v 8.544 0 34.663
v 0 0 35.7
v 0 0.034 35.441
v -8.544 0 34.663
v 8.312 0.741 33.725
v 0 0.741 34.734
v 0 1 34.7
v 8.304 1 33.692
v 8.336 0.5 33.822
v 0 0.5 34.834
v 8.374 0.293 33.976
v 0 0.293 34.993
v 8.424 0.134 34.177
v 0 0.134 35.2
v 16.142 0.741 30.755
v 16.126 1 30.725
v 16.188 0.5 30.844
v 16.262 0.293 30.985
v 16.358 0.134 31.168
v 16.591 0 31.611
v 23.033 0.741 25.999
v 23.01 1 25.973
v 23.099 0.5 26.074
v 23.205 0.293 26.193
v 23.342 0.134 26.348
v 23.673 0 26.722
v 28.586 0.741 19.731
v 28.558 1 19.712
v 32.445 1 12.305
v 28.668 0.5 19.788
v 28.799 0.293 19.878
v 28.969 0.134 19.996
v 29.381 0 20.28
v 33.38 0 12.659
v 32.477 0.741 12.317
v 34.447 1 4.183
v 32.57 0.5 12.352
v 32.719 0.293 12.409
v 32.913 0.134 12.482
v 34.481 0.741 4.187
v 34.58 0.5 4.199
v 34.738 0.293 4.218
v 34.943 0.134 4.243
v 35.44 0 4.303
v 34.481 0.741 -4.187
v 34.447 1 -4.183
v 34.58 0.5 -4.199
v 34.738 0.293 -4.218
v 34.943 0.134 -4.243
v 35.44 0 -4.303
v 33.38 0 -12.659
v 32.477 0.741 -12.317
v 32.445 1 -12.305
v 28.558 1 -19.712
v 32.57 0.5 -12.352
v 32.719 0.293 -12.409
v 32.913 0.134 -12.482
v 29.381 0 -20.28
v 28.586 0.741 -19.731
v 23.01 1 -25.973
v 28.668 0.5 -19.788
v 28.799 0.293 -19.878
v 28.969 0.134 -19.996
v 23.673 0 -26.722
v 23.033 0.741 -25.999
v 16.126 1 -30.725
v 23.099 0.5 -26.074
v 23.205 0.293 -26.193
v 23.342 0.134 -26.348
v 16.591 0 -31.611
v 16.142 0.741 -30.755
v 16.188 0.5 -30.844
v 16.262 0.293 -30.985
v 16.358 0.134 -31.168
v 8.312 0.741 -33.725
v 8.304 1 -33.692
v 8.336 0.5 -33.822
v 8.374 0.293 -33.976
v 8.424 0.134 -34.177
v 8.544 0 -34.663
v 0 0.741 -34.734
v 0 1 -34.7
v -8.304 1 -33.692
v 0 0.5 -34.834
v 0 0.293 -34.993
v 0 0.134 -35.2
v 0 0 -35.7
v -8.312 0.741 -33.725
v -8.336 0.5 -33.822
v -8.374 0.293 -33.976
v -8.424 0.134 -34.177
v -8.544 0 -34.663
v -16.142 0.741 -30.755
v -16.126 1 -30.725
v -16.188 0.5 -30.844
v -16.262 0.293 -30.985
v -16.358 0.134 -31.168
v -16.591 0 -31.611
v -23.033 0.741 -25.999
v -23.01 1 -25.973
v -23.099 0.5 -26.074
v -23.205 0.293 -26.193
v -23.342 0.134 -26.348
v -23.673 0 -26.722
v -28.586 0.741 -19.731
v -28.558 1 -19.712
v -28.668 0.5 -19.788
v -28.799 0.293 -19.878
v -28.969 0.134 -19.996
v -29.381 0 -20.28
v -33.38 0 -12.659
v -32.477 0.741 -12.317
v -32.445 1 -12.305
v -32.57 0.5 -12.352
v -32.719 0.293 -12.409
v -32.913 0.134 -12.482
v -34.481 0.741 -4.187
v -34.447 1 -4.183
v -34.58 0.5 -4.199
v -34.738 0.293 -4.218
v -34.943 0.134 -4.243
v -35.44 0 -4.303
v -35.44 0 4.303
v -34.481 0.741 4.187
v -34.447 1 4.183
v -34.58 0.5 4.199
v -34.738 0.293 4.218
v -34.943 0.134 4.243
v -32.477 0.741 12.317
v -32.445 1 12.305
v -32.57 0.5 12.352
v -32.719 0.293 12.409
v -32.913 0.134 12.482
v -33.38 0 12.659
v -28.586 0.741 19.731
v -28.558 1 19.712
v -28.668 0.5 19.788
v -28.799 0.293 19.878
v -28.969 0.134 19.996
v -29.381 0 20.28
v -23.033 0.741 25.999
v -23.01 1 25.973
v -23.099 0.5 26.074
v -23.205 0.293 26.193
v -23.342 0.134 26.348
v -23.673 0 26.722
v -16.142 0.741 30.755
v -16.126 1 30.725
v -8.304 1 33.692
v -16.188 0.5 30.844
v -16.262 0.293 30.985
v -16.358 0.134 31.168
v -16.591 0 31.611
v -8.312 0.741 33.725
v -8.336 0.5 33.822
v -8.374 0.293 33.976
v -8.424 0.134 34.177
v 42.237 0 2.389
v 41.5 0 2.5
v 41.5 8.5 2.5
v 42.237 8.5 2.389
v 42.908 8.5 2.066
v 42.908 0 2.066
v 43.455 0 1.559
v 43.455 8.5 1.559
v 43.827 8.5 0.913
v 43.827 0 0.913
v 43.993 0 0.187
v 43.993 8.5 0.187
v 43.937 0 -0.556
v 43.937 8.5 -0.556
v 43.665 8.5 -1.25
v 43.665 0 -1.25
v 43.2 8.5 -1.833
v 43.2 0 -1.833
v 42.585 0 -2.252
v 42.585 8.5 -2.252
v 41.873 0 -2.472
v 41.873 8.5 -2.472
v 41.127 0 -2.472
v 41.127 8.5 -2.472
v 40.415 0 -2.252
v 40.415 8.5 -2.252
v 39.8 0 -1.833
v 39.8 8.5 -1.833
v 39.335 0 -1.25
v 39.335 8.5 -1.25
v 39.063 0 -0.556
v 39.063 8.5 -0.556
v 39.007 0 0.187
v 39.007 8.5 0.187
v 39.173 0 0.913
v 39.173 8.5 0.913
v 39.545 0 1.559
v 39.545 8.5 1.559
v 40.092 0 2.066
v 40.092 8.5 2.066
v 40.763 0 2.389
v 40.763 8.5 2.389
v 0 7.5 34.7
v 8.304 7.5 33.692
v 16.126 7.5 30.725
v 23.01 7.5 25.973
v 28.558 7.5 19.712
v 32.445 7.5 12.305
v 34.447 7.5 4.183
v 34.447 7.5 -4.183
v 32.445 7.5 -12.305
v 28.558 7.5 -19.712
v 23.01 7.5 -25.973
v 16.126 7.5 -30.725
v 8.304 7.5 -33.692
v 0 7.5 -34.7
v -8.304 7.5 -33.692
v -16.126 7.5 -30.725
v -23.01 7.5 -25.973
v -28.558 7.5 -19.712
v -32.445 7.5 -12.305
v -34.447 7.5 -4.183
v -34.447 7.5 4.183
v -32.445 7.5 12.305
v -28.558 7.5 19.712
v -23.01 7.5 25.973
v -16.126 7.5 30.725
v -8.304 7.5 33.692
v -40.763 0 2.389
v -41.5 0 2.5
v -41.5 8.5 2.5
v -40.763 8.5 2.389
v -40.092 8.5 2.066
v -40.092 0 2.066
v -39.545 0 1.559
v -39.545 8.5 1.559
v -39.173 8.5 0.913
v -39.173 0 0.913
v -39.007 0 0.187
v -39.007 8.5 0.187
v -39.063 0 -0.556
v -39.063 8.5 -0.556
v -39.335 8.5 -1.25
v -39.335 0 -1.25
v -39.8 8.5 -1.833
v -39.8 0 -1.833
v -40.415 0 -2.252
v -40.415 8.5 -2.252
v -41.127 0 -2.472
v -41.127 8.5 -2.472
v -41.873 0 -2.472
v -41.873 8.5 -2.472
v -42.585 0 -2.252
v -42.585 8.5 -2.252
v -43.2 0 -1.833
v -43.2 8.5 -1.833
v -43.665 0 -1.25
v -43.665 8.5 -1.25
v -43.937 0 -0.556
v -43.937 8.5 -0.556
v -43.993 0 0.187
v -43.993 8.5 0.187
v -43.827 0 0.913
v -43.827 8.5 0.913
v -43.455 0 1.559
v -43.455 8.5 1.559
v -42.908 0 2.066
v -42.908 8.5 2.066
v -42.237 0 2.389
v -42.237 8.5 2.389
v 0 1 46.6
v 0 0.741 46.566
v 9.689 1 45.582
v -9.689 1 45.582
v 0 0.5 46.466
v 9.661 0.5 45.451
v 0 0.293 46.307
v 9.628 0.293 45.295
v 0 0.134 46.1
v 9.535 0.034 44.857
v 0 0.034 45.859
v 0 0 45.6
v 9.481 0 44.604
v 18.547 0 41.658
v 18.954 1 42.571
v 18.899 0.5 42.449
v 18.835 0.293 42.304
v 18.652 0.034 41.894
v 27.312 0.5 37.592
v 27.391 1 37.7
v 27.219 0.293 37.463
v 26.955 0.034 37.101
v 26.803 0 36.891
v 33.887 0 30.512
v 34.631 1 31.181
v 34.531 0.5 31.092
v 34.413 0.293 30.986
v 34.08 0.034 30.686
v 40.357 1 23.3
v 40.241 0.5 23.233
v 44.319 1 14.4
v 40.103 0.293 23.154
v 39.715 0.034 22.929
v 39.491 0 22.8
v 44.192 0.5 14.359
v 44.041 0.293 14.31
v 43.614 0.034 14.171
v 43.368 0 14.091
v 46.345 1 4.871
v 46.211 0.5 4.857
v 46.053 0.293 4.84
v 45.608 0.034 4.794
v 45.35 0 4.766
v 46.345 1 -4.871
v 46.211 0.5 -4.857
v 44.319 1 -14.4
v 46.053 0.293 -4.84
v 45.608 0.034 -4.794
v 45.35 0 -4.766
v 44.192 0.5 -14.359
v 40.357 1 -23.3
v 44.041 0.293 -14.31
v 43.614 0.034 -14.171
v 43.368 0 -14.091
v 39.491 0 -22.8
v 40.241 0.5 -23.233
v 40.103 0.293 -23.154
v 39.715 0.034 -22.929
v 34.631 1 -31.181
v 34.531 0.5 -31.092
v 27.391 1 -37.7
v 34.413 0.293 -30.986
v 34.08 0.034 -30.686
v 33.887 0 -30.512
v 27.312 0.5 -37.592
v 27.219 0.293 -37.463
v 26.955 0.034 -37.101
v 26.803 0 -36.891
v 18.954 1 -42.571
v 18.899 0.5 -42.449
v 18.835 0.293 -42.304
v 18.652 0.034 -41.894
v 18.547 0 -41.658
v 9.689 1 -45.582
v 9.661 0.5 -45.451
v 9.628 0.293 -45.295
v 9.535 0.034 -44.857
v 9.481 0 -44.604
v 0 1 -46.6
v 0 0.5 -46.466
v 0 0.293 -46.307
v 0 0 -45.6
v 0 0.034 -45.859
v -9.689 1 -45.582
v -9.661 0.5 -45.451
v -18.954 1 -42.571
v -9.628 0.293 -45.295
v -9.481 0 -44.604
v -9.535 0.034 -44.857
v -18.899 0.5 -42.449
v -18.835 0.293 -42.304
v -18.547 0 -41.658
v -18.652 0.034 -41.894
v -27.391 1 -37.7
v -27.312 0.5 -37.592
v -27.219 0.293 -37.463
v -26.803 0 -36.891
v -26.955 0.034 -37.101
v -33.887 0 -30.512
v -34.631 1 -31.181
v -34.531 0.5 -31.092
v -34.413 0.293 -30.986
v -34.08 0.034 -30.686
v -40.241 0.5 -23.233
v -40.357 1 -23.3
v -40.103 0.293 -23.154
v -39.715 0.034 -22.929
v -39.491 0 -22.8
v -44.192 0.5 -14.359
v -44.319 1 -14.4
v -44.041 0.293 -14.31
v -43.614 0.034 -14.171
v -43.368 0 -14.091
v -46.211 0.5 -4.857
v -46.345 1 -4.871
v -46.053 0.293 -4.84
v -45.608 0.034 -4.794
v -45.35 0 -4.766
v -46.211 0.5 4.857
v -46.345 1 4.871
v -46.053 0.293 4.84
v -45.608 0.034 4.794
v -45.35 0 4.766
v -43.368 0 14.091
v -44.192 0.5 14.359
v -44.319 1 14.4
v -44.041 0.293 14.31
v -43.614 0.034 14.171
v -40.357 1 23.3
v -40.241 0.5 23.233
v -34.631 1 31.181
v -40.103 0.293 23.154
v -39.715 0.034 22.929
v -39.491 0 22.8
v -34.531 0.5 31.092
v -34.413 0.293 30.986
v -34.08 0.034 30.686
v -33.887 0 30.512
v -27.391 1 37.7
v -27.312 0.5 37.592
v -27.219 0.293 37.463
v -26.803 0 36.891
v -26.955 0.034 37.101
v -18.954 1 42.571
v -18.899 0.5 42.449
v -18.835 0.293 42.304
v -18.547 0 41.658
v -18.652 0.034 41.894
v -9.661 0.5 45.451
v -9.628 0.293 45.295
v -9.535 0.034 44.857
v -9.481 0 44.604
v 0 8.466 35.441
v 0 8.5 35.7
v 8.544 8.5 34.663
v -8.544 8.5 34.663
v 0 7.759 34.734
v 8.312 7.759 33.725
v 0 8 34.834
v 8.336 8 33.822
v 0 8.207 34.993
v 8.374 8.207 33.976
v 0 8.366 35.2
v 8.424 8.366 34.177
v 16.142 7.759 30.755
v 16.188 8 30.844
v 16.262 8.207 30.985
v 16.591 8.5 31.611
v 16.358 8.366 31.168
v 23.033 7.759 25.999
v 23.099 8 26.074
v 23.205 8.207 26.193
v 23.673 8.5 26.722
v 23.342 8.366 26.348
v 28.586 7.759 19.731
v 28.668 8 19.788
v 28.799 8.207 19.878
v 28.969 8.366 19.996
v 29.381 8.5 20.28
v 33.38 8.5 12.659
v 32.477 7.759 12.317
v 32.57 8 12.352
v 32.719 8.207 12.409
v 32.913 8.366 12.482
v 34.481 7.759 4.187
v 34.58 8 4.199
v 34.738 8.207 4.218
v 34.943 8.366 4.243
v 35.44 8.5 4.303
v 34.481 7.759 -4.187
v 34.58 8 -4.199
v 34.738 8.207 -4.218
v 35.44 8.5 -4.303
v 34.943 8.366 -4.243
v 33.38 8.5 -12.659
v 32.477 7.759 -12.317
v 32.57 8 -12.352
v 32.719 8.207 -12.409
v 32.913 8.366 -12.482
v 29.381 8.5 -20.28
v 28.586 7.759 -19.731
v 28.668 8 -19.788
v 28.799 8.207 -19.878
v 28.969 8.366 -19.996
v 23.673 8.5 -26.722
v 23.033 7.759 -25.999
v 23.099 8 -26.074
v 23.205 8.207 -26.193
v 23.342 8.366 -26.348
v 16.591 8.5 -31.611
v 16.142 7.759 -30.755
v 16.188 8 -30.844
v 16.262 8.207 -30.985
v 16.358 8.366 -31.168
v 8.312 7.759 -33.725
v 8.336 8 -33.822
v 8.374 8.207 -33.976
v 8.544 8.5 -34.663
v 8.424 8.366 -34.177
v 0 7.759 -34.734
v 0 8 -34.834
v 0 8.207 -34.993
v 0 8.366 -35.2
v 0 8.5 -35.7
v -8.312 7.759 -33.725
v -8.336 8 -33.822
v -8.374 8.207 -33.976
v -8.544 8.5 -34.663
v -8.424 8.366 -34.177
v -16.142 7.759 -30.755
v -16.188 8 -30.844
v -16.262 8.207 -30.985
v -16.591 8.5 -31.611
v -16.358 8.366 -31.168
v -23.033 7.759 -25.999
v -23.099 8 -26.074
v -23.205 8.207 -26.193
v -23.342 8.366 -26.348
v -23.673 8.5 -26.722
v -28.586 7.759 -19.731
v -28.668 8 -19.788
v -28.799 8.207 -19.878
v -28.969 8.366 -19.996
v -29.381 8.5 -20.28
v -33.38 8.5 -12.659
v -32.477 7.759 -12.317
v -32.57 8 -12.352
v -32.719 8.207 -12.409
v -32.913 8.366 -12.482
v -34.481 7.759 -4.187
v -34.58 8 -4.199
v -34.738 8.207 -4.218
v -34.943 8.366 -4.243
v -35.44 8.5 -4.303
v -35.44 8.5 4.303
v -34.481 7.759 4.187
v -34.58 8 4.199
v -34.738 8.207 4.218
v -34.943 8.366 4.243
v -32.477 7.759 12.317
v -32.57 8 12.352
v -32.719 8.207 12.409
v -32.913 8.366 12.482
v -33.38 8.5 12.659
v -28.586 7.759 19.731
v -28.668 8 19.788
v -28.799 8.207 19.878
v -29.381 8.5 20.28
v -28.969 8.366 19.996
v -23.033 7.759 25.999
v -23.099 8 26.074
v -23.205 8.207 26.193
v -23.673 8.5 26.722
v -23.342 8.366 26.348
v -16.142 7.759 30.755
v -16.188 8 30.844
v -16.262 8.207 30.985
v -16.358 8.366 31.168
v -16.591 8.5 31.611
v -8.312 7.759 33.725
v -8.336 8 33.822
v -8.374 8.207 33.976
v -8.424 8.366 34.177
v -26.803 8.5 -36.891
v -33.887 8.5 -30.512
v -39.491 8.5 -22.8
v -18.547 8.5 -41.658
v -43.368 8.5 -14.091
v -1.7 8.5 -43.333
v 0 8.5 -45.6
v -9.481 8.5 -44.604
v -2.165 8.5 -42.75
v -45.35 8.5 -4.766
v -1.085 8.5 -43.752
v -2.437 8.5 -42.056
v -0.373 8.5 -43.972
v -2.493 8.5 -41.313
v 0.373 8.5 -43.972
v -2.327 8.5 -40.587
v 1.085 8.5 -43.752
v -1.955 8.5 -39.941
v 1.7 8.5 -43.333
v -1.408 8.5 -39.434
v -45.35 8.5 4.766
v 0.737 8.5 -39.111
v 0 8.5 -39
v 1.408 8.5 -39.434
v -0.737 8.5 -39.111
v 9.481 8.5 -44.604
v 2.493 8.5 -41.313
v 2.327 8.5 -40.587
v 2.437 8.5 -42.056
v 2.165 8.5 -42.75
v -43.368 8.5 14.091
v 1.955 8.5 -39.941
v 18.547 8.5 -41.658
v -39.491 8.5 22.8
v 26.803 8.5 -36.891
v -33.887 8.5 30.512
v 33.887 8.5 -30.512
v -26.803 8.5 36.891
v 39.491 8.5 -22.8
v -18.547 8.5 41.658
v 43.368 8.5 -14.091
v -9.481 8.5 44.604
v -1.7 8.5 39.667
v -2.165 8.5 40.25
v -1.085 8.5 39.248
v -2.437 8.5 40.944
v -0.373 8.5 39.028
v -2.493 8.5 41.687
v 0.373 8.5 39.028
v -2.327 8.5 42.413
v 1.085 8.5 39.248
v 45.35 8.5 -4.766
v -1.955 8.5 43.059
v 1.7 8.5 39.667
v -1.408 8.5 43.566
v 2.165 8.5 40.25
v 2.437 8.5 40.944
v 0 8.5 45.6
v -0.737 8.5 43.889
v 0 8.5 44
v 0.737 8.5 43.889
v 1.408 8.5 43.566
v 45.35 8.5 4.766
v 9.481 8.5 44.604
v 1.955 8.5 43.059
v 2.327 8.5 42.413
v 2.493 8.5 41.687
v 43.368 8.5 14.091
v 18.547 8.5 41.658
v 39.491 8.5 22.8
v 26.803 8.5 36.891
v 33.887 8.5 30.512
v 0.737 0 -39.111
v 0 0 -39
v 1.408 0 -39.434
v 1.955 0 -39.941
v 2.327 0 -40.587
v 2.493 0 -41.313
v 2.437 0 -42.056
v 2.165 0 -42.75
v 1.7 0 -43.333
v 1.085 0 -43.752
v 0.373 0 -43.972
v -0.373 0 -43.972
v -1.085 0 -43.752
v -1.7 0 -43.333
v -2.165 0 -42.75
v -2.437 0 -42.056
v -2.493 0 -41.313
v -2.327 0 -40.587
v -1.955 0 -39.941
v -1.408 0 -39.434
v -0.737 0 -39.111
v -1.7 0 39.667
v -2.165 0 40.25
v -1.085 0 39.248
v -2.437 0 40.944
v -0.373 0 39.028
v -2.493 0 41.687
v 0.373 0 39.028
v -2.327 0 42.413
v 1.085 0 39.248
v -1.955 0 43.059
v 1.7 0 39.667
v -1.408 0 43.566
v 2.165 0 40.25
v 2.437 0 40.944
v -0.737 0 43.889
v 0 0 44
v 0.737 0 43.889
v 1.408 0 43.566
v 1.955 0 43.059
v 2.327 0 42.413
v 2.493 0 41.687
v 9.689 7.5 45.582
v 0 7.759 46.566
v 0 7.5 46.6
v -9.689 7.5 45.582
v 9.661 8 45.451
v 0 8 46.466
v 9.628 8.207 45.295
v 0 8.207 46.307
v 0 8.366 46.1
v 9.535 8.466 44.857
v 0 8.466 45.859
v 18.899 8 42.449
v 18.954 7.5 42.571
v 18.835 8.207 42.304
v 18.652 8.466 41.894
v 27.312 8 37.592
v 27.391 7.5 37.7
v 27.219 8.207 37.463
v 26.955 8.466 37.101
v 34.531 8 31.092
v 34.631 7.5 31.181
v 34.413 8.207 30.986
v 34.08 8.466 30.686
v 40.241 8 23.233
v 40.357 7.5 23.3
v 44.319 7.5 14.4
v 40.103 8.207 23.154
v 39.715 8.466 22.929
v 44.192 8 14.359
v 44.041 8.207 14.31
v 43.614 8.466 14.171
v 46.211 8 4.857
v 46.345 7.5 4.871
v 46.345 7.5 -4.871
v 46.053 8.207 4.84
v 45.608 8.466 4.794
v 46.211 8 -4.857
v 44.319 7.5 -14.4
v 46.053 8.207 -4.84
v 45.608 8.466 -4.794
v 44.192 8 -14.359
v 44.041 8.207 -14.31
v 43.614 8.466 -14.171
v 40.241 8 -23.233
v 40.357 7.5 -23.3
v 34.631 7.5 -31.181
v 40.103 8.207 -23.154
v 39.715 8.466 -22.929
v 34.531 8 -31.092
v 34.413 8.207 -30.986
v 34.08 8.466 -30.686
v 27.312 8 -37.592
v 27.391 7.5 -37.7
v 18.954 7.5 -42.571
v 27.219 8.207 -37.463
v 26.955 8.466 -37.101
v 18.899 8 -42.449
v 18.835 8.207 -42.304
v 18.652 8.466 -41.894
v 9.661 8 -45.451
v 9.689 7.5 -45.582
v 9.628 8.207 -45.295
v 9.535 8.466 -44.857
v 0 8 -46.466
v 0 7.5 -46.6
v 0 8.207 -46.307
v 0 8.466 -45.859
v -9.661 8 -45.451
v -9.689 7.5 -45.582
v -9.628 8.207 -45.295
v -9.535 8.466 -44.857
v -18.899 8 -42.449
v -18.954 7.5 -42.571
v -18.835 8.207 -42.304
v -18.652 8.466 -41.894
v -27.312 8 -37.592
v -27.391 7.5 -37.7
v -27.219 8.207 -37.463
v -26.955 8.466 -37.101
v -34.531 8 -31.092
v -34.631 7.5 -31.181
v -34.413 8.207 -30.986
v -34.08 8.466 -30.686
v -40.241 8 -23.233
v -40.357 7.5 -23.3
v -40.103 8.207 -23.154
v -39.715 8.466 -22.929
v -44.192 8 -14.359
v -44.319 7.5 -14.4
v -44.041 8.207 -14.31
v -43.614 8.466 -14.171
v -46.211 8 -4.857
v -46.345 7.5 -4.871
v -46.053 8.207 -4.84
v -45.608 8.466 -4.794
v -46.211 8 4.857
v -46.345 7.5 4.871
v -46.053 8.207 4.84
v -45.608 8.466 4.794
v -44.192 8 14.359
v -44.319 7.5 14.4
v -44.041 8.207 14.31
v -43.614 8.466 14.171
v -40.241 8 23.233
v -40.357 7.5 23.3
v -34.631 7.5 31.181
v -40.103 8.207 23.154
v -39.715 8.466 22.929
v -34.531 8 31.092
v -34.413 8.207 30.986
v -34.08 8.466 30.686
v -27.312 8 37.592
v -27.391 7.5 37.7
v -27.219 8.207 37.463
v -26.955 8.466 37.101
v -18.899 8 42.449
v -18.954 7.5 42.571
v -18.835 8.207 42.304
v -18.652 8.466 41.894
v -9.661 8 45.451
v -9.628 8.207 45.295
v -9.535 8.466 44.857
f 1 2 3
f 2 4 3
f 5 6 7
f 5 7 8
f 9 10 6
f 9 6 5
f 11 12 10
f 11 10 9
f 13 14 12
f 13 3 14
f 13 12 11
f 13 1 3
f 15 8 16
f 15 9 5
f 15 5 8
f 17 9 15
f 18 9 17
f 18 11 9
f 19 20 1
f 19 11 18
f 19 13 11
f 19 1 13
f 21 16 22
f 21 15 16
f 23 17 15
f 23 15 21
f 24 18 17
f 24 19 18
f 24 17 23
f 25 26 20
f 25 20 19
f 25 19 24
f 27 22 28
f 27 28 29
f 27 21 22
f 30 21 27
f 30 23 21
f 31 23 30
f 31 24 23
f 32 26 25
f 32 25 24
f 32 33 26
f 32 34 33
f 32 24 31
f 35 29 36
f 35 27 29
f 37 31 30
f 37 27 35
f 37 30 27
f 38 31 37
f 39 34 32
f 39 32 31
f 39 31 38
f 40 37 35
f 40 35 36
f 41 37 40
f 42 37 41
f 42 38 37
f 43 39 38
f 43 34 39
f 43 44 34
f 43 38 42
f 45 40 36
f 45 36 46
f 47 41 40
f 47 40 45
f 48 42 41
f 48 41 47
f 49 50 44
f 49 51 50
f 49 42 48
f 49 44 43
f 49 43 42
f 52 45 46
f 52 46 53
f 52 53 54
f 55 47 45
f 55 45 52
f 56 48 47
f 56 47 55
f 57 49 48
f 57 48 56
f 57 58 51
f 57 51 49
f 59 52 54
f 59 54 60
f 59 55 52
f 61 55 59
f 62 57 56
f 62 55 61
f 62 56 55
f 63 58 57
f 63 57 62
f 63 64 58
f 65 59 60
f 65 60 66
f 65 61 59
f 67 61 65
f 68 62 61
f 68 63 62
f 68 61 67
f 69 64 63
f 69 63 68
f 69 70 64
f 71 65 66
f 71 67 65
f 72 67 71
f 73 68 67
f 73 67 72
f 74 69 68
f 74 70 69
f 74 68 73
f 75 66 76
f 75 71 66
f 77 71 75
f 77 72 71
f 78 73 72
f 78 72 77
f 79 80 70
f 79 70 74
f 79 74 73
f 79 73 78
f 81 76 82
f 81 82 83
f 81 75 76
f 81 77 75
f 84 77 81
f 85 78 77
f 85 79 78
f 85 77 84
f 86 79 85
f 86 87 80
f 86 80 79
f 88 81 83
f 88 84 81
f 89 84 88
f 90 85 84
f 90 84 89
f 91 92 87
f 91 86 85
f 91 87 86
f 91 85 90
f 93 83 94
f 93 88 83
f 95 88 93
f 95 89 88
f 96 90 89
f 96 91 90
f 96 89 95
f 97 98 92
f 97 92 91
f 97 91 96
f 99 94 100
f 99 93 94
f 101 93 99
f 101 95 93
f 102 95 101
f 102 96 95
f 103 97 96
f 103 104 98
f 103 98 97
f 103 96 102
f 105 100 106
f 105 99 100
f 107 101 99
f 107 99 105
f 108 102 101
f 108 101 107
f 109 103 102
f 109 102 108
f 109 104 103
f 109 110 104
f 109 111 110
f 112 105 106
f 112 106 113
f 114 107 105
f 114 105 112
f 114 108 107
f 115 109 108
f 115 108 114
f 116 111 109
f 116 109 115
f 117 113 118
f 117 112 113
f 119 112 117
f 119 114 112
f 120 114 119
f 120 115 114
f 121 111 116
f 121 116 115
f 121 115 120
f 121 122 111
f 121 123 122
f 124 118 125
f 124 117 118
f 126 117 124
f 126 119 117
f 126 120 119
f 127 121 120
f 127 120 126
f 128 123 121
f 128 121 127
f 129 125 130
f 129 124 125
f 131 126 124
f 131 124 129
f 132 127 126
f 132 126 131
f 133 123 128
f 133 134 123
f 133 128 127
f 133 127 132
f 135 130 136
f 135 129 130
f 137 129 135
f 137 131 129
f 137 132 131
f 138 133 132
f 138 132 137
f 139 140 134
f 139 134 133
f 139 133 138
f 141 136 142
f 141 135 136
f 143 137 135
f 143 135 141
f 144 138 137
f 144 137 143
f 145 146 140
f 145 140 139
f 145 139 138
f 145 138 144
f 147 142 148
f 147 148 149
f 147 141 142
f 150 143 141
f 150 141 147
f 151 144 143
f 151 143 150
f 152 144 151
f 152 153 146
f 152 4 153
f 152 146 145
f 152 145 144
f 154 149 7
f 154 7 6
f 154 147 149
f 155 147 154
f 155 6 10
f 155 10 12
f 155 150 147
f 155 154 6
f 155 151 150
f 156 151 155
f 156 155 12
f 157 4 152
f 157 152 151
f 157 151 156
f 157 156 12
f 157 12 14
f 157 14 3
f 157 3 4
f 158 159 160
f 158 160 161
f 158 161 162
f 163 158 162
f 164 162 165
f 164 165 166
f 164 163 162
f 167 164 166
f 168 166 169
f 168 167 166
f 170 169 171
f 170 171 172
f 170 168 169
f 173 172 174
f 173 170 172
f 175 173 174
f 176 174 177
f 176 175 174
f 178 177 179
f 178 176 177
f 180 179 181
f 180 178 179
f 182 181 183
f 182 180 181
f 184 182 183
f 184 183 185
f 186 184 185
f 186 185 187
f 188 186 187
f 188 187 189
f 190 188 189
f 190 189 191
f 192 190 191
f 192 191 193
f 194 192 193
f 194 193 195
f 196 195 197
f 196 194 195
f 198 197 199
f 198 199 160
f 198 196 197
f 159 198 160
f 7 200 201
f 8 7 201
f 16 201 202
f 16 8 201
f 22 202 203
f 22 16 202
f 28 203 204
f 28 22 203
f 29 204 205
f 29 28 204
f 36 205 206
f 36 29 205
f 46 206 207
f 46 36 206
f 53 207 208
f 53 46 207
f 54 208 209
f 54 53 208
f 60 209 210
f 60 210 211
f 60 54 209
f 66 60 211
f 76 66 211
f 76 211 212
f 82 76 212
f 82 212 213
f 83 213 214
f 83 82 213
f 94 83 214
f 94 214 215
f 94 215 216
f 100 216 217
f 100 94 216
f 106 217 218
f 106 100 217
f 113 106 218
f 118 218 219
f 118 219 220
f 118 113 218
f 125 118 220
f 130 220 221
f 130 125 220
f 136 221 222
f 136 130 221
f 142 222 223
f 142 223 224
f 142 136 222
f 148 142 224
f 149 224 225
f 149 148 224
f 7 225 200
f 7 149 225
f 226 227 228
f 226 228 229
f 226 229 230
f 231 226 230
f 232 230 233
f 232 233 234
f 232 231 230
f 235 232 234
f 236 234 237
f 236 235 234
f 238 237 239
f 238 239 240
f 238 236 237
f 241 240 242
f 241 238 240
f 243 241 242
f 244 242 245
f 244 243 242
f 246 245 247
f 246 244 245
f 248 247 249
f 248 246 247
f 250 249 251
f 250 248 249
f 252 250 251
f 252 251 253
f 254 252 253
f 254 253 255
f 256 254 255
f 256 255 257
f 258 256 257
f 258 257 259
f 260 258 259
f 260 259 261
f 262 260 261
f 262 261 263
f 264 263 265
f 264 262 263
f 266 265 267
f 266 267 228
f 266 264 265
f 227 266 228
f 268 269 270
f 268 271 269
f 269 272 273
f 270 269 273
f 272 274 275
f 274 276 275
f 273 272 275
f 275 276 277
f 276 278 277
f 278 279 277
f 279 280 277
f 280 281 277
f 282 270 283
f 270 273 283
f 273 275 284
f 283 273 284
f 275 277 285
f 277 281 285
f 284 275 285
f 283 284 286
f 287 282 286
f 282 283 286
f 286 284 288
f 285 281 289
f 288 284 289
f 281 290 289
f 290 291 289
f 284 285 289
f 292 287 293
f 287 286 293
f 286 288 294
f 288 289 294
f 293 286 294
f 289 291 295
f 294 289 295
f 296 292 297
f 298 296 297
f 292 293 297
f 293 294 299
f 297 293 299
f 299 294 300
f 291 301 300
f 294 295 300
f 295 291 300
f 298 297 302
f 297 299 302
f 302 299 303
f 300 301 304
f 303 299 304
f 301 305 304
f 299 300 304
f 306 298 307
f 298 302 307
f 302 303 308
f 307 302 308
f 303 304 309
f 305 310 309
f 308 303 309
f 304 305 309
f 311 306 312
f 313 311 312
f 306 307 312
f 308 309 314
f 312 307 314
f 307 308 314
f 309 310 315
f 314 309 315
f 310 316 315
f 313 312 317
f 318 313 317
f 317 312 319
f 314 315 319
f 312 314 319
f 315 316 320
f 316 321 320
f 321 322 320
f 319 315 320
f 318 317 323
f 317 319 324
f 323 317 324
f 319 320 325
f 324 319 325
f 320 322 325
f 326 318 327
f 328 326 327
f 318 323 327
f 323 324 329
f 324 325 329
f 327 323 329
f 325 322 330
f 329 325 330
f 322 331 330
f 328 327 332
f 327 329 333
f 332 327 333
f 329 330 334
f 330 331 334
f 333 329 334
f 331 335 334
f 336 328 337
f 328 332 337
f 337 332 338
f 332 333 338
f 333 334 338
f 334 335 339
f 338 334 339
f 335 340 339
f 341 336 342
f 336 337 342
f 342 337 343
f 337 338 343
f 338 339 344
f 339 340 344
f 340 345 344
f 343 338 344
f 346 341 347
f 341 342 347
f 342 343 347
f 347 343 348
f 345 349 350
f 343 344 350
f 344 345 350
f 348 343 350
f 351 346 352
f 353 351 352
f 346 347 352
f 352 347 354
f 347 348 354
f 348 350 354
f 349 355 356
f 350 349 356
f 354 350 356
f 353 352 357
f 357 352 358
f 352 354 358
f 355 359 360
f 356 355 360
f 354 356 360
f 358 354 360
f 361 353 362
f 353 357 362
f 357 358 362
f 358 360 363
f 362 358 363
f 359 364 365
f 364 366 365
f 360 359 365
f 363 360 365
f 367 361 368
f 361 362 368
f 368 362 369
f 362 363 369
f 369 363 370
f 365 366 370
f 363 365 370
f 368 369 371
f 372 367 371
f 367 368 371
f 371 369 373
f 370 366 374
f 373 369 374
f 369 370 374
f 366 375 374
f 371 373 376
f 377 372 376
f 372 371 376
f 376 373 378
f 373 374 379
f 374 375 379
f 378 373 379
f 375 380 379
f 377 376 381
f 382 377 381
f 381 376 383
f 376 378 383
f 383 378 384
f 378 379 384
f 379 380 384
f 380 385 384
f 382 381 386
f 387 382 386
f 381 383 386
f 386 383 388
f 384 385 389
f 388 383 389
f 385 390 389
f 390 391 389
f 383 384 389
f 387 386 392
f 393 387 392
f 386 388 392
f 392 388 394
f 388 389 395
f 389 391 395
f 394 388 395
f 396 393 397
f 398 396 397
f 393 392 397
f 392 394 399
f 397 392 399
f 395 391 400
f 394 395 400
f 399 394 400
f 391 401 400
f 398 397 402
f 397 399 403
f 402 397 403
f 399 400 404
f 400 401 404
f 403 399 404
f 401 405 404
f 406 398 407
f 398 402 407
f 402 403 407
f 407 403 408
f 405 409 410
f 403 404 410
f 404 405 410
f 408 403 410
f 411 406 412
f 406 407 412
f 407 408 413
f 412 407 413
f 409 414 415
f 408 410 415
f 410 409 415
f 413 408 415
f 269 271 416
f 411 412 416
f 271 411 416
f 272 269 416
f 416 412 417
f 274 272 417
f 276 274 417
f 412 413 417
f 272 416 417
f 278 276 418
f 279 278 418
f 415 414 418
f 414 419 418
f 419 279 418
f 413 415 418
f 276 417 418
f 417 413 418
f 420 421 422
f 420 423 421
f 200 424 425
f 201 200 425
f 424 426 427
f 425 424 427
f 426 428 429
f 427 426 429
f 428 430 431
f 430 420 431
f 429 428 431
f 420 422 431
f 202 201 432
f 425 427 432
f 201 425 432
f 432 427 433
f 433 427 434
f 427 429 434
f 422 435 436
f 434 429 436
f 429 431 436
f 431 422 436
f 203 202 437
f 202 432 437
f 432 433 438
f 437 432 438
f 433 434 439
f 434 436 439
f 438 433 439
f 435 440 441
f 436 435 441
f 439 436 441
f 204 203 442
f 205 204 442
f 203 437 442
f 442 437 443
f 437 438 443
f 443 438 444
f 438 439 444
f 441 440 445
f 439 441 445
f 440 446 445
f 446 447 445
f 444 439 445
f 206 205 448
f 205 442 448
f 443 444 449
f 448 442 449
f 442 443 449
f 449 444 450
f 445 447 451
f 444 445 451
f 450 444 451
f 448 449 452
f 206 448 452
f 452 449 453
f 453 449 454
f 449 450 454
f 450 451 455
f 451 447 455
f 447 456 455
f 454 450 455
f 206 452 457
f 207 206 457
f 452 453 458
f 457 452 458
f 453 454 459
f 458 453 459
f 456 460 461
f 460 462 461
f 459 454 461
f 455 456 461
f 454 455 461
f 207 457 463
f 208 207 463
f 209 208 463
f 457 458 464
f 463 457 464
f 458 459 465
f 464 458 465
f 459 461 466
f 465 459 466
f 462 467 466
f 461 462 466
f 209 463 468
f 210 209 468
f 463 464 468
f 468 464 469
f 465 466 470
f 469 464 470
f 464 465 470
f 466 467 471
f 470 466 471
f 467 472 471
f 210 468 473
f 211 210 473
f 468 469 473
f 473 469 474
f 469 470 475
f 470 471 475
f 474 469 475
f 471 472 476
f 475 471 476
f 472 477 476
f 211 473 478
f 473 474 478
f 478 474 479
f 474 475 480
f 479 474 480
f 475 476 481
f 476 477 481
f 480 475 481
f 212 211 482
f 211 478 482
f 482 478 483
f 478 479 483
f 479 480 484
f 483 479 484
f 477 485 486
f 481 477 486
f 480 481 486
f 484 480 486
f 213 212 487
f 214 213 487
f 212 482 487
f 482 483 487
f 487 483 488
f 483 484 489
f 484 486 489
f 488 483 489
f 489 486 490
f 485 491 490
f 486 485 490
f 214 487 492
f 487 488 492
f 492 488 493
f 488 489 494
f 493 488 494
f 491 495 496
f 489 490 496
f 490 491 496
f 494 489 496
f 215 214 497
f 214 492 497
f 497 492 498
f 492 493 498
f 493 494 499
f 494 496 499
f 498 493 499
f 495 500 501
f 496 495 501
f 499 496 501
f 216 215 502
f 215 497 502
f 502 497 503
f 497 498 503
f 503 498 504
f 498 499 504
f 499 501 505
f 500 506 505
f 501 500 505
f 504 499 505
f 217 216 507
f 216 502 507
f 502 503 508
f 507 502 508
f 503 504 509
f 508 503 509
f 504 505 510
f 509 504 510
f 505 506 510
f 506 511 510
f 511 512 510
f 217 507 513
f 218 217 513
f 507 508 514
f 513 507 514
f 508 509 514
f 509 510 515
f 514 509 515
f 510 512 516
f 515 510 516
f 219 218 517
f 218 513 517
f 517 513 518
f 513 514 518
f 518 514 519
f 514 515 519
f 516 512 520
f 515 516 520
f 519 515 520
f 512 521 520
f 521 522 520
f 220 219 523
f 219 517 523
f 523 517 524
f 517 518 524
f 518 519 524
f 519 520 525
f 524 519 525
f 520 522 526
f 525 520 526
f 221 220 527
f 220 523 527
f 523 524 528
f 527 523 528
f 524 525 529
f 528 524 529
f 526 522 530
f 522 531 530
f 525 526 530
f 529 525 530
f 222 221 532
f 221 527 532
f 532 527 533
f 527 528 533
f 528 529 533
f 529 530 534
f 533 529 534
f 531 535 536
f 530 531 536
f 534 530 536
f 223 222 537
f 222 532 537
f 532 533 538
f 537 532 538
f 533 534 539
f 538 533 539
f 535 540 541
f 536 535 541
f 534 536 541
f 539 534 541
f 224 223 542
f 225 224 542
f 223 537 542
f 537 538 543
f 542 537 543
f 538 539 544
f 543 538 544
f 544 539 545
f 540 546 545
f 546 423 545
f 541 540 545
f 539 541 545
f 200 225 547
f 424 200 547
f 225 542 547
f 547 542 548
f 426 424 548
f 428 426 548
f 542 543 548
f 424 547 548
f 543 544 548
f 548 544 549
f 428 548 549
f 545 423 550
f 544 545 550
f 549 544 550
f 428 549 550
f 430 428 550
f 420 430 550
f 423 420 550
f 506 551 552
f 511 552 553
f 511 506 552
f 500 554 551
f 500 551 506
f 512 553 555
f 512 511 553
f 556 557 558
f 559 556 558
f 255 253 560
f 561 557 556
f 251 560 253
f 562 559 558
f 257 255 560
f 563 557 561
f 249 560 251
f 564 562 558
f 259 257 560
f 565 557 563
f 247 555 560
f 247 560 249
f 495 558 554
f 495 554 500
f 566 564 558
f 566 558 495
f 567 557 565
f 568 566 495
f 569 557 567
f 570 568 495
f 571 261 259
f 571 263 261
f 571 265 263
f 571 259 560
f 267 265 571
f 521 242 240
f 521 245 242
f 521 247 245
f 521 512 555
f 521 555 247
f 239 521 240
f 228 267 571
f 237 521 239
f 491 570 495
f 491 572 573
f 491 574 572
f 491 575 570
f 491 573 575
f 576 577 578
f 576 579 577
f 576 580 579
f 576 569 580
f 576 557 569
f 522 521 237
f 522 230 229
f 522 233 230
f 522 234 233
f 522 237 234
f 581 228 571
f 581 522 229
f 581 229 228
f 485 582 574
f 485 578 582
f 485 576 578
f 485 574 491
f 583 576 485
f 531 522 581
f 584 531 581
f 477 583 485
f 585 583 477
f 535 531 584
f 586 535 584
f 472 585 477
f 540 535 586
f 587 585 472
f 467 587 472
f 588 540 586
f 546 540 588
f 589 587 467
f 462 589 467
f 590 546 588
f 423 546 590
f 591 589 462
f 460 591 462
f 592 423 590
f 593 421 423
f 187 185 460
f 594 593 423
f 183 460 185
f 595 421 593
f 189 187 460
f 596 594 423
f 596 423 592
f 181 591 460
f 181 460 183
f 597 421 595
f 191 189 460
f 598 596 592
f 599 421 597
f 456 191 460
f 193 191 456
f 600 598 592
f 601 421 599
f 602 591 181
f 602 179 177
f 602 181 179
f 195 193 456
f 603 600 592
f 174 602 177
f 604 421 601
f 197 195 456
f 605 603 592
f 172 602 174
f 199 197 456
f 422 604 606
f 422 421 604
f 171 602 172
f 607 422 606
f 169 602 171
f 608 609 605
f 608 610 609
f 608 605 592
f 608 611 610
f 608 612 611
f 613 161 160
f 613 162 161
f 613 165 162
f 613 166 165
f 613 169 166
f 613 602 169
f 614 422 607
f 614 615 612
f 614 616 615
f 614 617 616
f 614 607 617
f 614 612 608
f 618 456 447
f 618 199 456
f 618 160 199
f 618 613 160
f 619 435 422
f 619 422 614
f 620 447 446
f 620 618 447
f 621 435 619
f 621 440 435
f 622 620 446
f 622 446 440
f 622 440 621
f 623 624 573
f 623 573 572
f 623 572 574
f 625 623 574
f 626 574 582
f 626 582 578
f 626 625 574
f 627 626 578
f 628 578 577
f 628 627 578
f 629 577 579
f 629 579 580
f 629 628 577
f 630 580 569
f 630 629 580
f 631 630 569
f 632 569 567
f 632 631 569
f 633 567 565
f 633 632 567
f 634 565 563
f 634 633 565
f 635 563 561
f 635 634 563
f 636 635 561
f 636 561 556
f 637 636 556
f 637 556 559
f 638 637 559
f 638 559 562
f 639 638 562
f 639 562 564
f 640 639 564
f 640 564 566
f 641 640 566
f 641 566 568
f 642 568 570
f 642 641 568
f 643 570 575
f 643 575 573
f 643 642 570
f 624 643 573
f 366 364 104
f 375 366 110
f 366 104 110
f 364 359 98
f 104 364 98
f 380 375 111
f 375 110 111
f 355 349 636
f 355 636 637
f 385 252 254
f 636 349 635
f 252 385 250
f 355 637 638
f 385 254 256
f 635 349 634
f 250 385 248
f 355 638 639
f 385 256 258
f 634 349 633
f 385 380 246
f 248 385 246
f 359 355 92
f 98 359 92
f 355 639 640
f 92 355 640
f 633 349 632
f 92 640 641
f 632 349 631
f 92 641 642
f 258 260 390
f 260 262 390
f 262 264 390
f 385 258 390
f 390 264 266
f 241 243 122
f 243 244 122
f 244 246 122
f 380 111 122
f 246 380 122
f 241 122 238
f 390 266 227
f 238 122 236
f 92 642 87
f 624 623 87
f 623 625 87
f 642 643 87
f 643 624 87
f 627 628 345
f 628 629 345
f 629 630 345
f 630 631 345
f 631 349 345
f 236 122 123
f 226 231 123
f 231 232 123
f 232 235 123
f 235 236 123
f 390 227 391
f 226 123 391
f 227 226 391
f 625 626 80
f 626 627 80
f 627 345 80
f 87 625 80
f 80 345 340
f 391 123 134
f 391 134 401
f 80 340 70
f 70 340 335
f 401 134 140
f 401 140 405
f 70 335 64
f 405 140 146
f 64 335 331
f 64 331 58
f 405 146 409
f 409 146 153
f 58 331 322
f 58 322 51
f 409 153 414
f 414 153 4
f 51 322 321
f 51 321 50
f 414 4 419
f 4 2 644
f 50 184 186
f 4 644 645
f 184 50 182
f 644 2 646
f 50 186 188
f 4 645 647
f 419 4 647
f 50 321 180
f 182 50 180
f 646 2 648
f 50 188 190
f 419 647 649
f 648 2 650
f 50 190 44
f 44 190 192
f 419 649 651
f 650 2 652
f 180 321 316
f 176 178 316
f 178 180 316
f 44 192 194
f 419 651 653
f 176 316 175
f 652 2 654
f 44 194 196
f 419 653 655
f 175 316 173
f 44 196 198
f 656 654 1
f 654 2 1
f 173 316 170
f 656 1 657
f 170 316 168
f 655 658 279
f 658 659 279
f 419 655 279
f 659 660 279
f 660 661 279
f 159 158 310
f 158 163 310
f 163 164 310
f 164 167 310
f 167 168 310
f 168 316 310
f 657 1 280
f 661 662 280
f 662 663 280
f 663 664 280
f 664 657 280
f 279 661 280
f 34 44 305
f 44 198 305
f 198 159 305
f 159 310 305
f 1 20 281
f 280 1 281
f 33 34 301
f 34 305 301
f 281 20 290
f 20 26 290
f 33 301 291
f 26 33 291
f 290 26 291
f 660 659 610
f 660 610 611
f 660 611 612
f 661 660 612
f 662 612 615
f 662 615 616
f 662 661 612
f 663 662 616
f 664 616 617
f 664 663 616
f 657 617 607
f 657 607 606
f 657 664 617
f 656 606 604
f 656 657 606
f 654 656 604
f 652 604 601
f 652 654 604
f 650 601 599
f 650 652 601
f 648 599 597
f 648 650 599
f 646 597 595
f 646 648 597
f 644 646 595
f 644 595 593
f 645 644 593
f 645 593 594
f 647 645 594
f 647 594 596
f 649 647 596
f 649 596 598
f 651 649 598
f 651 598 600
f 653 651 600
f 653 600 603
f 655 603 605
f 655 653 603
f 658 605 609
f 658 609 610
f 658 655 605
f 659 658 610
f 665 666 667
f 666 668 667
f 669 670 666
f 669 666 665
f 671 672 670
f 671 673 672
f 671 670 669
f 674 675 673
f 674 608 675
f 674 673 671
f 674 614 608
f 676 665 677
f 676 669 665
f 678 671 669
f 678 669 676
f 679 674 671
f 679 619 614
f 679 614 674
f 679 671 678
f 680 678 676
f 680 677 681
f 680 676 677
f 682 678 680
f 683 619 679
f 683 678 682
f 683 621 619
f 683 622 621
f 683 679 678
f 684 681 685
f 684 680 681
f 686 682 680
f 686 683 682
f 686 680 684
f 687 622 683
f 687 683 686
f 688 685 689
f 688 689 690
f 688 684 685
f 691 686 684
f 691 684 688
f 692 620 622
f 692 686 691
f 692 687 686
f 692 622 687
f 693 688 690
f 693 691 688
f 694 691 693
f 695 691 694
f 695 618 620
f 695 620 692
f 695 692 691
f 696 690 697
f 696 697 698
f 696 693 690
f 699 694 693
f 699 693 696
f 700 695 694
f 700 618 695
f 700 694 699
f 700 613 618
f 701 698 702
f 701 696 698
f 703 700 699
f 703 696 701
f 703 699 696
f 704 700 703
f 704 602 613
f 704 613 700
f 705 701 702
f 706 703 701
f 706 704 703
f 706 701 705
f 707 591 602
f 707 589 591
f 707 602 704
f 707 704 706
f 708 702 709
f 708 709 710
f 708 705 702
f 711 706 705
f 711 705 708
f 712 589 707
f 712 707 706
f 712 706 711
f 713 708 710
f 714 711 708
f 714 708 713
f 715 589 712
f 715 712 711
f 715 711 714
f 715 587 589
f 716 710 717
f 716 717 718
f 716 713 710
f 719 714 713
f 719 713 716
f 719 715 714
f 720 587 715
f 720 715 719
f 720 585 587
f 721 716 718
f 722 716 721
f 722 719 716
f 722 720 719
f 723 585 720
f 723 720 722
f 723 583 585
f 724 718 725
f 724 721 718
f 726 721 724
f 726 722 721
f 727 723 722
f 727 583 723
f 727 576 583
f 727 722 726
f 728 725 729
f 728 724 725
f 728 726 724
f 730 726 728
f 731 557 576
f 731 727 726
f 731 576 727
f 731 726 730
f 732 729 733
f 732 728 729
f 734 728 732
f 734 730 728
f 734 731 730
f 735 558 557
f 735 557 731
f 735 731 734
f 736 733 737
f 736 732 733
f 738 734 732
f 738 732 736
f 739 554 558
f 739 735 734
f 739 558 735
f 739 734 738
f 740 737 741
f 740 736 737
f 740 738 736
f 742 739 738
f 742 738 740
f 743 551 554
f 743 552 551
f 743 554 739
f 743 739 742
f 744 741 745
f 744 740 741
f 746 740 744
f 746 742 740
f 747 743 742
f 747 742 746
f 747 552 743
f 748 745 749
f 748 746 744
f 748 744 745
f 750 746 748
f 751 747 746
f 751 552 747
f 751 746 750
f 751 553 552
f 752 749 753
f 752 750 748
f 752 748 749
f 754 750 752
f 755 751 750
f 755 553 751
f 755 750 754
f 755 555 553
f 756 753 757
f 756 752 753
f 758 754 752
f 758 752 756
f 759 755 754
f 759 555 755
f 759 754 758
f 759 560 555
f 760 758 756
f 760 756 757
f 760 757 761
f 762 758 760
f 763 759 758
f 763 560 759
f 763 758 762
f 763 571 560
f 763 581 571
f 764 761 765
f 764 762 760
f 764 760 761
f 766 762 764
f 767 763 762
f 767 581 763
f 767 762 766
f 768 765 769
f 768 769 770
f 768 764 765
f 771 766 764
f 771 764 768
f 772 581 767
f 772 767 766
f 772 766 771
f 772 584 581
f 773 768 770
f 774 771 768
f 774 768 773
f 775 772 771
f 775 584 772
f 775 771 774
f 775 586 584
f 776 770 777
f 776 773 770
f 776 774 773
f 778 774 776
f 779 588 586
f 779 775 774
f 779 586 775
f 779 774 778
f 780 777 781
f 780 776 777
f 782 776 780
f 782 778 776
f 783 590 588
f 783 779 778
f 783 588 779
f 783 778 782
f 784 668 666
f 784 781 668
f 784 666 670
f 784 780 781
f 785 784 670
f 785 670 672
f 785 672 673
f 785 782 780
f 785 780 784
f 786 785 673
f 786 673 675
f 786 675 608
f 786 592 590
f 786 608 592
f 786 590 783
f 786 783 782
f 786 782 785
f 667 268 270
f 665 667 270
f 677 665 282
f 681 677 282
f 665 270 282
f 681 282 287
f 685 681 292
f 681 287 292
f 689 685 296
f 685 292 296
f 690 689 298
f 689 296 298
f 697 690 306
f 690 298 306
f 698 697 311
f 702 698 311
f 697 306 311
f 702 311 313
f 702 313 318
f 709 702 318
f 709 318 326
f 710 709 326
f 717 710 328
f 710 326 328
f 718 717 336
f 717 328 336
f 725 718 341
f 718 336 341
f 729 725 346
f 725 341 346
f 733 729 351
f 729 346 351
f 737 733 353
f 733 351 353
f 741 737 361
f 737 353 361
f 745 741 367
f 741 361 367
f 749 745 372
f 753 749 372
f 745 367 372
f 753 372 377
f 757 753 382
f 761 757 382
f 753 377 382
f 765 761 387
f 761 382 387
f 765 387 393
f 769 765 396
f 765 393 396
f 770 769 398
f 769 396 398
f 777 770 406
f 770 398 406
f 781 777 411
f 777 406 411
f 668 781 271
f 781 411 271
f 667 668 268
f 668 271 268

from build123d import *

# Parameters (mm, degrees)
SKETCH1_R           = 46.6
SKETCH1_R_2         = 34.7
SKETCH1_R_3         = 2.5
BOSS_EXTRUDE1_DEPTH = 8.5
FILLET1_R           = 1


with BuildPart() as part:
    # Sketch1 → Boss-Extrude1 (new body)
    with BuildSketch(Plane(origin=(0, 0, 0), x_dir=(1, 0, 0), z_dir=(0, 1, 0))):
        with Locations(Location((0, 0, 0), (0, 0, 270))):
            Circle(SKETCH1_R)
        with Locations(Location((0, 0, 0), (0, 0, 270))):
            Circle(SKETCH1_R_2, mode=Mode.SUBTRACT)
        with Locations(Location((0, 41.5, 0), (0, 0, 270))):
            Circle(SKETCH1_R_3, mode=Mode.SUBTRACT)
        with Locations(Location((41.5, 0, 0), (0, 0, 270))):
            Circle(SKETCH1_R_3, mode=Mode.SUBTRACT)
        with Locations(Location((0, -41.5, 0), (0, 0, 270))):
            Circle(SKETCH1_R_3, mode=Mode.SUBTRACT)
        with Locations(Location((-41.5, 0, 0), (0, 0, 270))):
            Circle(SKETCH1_R_3, mode=Mode.SUBTRACT)
    extrude(amount=BOSS_EXTRUDE1_DEPTH)

    # Fillet1
    fillet1_edges = [part.edges().sort_by_distance(p)[0] for p in [
        (0, 0, -46.6),
        (0, 8.5, -46.6),
        (0, 0, -34.7),
        (0, 8.5, -34.7),
    ]]
    fillet(fillet1_edges, radius=FILLET1_R)


solid = part.part
